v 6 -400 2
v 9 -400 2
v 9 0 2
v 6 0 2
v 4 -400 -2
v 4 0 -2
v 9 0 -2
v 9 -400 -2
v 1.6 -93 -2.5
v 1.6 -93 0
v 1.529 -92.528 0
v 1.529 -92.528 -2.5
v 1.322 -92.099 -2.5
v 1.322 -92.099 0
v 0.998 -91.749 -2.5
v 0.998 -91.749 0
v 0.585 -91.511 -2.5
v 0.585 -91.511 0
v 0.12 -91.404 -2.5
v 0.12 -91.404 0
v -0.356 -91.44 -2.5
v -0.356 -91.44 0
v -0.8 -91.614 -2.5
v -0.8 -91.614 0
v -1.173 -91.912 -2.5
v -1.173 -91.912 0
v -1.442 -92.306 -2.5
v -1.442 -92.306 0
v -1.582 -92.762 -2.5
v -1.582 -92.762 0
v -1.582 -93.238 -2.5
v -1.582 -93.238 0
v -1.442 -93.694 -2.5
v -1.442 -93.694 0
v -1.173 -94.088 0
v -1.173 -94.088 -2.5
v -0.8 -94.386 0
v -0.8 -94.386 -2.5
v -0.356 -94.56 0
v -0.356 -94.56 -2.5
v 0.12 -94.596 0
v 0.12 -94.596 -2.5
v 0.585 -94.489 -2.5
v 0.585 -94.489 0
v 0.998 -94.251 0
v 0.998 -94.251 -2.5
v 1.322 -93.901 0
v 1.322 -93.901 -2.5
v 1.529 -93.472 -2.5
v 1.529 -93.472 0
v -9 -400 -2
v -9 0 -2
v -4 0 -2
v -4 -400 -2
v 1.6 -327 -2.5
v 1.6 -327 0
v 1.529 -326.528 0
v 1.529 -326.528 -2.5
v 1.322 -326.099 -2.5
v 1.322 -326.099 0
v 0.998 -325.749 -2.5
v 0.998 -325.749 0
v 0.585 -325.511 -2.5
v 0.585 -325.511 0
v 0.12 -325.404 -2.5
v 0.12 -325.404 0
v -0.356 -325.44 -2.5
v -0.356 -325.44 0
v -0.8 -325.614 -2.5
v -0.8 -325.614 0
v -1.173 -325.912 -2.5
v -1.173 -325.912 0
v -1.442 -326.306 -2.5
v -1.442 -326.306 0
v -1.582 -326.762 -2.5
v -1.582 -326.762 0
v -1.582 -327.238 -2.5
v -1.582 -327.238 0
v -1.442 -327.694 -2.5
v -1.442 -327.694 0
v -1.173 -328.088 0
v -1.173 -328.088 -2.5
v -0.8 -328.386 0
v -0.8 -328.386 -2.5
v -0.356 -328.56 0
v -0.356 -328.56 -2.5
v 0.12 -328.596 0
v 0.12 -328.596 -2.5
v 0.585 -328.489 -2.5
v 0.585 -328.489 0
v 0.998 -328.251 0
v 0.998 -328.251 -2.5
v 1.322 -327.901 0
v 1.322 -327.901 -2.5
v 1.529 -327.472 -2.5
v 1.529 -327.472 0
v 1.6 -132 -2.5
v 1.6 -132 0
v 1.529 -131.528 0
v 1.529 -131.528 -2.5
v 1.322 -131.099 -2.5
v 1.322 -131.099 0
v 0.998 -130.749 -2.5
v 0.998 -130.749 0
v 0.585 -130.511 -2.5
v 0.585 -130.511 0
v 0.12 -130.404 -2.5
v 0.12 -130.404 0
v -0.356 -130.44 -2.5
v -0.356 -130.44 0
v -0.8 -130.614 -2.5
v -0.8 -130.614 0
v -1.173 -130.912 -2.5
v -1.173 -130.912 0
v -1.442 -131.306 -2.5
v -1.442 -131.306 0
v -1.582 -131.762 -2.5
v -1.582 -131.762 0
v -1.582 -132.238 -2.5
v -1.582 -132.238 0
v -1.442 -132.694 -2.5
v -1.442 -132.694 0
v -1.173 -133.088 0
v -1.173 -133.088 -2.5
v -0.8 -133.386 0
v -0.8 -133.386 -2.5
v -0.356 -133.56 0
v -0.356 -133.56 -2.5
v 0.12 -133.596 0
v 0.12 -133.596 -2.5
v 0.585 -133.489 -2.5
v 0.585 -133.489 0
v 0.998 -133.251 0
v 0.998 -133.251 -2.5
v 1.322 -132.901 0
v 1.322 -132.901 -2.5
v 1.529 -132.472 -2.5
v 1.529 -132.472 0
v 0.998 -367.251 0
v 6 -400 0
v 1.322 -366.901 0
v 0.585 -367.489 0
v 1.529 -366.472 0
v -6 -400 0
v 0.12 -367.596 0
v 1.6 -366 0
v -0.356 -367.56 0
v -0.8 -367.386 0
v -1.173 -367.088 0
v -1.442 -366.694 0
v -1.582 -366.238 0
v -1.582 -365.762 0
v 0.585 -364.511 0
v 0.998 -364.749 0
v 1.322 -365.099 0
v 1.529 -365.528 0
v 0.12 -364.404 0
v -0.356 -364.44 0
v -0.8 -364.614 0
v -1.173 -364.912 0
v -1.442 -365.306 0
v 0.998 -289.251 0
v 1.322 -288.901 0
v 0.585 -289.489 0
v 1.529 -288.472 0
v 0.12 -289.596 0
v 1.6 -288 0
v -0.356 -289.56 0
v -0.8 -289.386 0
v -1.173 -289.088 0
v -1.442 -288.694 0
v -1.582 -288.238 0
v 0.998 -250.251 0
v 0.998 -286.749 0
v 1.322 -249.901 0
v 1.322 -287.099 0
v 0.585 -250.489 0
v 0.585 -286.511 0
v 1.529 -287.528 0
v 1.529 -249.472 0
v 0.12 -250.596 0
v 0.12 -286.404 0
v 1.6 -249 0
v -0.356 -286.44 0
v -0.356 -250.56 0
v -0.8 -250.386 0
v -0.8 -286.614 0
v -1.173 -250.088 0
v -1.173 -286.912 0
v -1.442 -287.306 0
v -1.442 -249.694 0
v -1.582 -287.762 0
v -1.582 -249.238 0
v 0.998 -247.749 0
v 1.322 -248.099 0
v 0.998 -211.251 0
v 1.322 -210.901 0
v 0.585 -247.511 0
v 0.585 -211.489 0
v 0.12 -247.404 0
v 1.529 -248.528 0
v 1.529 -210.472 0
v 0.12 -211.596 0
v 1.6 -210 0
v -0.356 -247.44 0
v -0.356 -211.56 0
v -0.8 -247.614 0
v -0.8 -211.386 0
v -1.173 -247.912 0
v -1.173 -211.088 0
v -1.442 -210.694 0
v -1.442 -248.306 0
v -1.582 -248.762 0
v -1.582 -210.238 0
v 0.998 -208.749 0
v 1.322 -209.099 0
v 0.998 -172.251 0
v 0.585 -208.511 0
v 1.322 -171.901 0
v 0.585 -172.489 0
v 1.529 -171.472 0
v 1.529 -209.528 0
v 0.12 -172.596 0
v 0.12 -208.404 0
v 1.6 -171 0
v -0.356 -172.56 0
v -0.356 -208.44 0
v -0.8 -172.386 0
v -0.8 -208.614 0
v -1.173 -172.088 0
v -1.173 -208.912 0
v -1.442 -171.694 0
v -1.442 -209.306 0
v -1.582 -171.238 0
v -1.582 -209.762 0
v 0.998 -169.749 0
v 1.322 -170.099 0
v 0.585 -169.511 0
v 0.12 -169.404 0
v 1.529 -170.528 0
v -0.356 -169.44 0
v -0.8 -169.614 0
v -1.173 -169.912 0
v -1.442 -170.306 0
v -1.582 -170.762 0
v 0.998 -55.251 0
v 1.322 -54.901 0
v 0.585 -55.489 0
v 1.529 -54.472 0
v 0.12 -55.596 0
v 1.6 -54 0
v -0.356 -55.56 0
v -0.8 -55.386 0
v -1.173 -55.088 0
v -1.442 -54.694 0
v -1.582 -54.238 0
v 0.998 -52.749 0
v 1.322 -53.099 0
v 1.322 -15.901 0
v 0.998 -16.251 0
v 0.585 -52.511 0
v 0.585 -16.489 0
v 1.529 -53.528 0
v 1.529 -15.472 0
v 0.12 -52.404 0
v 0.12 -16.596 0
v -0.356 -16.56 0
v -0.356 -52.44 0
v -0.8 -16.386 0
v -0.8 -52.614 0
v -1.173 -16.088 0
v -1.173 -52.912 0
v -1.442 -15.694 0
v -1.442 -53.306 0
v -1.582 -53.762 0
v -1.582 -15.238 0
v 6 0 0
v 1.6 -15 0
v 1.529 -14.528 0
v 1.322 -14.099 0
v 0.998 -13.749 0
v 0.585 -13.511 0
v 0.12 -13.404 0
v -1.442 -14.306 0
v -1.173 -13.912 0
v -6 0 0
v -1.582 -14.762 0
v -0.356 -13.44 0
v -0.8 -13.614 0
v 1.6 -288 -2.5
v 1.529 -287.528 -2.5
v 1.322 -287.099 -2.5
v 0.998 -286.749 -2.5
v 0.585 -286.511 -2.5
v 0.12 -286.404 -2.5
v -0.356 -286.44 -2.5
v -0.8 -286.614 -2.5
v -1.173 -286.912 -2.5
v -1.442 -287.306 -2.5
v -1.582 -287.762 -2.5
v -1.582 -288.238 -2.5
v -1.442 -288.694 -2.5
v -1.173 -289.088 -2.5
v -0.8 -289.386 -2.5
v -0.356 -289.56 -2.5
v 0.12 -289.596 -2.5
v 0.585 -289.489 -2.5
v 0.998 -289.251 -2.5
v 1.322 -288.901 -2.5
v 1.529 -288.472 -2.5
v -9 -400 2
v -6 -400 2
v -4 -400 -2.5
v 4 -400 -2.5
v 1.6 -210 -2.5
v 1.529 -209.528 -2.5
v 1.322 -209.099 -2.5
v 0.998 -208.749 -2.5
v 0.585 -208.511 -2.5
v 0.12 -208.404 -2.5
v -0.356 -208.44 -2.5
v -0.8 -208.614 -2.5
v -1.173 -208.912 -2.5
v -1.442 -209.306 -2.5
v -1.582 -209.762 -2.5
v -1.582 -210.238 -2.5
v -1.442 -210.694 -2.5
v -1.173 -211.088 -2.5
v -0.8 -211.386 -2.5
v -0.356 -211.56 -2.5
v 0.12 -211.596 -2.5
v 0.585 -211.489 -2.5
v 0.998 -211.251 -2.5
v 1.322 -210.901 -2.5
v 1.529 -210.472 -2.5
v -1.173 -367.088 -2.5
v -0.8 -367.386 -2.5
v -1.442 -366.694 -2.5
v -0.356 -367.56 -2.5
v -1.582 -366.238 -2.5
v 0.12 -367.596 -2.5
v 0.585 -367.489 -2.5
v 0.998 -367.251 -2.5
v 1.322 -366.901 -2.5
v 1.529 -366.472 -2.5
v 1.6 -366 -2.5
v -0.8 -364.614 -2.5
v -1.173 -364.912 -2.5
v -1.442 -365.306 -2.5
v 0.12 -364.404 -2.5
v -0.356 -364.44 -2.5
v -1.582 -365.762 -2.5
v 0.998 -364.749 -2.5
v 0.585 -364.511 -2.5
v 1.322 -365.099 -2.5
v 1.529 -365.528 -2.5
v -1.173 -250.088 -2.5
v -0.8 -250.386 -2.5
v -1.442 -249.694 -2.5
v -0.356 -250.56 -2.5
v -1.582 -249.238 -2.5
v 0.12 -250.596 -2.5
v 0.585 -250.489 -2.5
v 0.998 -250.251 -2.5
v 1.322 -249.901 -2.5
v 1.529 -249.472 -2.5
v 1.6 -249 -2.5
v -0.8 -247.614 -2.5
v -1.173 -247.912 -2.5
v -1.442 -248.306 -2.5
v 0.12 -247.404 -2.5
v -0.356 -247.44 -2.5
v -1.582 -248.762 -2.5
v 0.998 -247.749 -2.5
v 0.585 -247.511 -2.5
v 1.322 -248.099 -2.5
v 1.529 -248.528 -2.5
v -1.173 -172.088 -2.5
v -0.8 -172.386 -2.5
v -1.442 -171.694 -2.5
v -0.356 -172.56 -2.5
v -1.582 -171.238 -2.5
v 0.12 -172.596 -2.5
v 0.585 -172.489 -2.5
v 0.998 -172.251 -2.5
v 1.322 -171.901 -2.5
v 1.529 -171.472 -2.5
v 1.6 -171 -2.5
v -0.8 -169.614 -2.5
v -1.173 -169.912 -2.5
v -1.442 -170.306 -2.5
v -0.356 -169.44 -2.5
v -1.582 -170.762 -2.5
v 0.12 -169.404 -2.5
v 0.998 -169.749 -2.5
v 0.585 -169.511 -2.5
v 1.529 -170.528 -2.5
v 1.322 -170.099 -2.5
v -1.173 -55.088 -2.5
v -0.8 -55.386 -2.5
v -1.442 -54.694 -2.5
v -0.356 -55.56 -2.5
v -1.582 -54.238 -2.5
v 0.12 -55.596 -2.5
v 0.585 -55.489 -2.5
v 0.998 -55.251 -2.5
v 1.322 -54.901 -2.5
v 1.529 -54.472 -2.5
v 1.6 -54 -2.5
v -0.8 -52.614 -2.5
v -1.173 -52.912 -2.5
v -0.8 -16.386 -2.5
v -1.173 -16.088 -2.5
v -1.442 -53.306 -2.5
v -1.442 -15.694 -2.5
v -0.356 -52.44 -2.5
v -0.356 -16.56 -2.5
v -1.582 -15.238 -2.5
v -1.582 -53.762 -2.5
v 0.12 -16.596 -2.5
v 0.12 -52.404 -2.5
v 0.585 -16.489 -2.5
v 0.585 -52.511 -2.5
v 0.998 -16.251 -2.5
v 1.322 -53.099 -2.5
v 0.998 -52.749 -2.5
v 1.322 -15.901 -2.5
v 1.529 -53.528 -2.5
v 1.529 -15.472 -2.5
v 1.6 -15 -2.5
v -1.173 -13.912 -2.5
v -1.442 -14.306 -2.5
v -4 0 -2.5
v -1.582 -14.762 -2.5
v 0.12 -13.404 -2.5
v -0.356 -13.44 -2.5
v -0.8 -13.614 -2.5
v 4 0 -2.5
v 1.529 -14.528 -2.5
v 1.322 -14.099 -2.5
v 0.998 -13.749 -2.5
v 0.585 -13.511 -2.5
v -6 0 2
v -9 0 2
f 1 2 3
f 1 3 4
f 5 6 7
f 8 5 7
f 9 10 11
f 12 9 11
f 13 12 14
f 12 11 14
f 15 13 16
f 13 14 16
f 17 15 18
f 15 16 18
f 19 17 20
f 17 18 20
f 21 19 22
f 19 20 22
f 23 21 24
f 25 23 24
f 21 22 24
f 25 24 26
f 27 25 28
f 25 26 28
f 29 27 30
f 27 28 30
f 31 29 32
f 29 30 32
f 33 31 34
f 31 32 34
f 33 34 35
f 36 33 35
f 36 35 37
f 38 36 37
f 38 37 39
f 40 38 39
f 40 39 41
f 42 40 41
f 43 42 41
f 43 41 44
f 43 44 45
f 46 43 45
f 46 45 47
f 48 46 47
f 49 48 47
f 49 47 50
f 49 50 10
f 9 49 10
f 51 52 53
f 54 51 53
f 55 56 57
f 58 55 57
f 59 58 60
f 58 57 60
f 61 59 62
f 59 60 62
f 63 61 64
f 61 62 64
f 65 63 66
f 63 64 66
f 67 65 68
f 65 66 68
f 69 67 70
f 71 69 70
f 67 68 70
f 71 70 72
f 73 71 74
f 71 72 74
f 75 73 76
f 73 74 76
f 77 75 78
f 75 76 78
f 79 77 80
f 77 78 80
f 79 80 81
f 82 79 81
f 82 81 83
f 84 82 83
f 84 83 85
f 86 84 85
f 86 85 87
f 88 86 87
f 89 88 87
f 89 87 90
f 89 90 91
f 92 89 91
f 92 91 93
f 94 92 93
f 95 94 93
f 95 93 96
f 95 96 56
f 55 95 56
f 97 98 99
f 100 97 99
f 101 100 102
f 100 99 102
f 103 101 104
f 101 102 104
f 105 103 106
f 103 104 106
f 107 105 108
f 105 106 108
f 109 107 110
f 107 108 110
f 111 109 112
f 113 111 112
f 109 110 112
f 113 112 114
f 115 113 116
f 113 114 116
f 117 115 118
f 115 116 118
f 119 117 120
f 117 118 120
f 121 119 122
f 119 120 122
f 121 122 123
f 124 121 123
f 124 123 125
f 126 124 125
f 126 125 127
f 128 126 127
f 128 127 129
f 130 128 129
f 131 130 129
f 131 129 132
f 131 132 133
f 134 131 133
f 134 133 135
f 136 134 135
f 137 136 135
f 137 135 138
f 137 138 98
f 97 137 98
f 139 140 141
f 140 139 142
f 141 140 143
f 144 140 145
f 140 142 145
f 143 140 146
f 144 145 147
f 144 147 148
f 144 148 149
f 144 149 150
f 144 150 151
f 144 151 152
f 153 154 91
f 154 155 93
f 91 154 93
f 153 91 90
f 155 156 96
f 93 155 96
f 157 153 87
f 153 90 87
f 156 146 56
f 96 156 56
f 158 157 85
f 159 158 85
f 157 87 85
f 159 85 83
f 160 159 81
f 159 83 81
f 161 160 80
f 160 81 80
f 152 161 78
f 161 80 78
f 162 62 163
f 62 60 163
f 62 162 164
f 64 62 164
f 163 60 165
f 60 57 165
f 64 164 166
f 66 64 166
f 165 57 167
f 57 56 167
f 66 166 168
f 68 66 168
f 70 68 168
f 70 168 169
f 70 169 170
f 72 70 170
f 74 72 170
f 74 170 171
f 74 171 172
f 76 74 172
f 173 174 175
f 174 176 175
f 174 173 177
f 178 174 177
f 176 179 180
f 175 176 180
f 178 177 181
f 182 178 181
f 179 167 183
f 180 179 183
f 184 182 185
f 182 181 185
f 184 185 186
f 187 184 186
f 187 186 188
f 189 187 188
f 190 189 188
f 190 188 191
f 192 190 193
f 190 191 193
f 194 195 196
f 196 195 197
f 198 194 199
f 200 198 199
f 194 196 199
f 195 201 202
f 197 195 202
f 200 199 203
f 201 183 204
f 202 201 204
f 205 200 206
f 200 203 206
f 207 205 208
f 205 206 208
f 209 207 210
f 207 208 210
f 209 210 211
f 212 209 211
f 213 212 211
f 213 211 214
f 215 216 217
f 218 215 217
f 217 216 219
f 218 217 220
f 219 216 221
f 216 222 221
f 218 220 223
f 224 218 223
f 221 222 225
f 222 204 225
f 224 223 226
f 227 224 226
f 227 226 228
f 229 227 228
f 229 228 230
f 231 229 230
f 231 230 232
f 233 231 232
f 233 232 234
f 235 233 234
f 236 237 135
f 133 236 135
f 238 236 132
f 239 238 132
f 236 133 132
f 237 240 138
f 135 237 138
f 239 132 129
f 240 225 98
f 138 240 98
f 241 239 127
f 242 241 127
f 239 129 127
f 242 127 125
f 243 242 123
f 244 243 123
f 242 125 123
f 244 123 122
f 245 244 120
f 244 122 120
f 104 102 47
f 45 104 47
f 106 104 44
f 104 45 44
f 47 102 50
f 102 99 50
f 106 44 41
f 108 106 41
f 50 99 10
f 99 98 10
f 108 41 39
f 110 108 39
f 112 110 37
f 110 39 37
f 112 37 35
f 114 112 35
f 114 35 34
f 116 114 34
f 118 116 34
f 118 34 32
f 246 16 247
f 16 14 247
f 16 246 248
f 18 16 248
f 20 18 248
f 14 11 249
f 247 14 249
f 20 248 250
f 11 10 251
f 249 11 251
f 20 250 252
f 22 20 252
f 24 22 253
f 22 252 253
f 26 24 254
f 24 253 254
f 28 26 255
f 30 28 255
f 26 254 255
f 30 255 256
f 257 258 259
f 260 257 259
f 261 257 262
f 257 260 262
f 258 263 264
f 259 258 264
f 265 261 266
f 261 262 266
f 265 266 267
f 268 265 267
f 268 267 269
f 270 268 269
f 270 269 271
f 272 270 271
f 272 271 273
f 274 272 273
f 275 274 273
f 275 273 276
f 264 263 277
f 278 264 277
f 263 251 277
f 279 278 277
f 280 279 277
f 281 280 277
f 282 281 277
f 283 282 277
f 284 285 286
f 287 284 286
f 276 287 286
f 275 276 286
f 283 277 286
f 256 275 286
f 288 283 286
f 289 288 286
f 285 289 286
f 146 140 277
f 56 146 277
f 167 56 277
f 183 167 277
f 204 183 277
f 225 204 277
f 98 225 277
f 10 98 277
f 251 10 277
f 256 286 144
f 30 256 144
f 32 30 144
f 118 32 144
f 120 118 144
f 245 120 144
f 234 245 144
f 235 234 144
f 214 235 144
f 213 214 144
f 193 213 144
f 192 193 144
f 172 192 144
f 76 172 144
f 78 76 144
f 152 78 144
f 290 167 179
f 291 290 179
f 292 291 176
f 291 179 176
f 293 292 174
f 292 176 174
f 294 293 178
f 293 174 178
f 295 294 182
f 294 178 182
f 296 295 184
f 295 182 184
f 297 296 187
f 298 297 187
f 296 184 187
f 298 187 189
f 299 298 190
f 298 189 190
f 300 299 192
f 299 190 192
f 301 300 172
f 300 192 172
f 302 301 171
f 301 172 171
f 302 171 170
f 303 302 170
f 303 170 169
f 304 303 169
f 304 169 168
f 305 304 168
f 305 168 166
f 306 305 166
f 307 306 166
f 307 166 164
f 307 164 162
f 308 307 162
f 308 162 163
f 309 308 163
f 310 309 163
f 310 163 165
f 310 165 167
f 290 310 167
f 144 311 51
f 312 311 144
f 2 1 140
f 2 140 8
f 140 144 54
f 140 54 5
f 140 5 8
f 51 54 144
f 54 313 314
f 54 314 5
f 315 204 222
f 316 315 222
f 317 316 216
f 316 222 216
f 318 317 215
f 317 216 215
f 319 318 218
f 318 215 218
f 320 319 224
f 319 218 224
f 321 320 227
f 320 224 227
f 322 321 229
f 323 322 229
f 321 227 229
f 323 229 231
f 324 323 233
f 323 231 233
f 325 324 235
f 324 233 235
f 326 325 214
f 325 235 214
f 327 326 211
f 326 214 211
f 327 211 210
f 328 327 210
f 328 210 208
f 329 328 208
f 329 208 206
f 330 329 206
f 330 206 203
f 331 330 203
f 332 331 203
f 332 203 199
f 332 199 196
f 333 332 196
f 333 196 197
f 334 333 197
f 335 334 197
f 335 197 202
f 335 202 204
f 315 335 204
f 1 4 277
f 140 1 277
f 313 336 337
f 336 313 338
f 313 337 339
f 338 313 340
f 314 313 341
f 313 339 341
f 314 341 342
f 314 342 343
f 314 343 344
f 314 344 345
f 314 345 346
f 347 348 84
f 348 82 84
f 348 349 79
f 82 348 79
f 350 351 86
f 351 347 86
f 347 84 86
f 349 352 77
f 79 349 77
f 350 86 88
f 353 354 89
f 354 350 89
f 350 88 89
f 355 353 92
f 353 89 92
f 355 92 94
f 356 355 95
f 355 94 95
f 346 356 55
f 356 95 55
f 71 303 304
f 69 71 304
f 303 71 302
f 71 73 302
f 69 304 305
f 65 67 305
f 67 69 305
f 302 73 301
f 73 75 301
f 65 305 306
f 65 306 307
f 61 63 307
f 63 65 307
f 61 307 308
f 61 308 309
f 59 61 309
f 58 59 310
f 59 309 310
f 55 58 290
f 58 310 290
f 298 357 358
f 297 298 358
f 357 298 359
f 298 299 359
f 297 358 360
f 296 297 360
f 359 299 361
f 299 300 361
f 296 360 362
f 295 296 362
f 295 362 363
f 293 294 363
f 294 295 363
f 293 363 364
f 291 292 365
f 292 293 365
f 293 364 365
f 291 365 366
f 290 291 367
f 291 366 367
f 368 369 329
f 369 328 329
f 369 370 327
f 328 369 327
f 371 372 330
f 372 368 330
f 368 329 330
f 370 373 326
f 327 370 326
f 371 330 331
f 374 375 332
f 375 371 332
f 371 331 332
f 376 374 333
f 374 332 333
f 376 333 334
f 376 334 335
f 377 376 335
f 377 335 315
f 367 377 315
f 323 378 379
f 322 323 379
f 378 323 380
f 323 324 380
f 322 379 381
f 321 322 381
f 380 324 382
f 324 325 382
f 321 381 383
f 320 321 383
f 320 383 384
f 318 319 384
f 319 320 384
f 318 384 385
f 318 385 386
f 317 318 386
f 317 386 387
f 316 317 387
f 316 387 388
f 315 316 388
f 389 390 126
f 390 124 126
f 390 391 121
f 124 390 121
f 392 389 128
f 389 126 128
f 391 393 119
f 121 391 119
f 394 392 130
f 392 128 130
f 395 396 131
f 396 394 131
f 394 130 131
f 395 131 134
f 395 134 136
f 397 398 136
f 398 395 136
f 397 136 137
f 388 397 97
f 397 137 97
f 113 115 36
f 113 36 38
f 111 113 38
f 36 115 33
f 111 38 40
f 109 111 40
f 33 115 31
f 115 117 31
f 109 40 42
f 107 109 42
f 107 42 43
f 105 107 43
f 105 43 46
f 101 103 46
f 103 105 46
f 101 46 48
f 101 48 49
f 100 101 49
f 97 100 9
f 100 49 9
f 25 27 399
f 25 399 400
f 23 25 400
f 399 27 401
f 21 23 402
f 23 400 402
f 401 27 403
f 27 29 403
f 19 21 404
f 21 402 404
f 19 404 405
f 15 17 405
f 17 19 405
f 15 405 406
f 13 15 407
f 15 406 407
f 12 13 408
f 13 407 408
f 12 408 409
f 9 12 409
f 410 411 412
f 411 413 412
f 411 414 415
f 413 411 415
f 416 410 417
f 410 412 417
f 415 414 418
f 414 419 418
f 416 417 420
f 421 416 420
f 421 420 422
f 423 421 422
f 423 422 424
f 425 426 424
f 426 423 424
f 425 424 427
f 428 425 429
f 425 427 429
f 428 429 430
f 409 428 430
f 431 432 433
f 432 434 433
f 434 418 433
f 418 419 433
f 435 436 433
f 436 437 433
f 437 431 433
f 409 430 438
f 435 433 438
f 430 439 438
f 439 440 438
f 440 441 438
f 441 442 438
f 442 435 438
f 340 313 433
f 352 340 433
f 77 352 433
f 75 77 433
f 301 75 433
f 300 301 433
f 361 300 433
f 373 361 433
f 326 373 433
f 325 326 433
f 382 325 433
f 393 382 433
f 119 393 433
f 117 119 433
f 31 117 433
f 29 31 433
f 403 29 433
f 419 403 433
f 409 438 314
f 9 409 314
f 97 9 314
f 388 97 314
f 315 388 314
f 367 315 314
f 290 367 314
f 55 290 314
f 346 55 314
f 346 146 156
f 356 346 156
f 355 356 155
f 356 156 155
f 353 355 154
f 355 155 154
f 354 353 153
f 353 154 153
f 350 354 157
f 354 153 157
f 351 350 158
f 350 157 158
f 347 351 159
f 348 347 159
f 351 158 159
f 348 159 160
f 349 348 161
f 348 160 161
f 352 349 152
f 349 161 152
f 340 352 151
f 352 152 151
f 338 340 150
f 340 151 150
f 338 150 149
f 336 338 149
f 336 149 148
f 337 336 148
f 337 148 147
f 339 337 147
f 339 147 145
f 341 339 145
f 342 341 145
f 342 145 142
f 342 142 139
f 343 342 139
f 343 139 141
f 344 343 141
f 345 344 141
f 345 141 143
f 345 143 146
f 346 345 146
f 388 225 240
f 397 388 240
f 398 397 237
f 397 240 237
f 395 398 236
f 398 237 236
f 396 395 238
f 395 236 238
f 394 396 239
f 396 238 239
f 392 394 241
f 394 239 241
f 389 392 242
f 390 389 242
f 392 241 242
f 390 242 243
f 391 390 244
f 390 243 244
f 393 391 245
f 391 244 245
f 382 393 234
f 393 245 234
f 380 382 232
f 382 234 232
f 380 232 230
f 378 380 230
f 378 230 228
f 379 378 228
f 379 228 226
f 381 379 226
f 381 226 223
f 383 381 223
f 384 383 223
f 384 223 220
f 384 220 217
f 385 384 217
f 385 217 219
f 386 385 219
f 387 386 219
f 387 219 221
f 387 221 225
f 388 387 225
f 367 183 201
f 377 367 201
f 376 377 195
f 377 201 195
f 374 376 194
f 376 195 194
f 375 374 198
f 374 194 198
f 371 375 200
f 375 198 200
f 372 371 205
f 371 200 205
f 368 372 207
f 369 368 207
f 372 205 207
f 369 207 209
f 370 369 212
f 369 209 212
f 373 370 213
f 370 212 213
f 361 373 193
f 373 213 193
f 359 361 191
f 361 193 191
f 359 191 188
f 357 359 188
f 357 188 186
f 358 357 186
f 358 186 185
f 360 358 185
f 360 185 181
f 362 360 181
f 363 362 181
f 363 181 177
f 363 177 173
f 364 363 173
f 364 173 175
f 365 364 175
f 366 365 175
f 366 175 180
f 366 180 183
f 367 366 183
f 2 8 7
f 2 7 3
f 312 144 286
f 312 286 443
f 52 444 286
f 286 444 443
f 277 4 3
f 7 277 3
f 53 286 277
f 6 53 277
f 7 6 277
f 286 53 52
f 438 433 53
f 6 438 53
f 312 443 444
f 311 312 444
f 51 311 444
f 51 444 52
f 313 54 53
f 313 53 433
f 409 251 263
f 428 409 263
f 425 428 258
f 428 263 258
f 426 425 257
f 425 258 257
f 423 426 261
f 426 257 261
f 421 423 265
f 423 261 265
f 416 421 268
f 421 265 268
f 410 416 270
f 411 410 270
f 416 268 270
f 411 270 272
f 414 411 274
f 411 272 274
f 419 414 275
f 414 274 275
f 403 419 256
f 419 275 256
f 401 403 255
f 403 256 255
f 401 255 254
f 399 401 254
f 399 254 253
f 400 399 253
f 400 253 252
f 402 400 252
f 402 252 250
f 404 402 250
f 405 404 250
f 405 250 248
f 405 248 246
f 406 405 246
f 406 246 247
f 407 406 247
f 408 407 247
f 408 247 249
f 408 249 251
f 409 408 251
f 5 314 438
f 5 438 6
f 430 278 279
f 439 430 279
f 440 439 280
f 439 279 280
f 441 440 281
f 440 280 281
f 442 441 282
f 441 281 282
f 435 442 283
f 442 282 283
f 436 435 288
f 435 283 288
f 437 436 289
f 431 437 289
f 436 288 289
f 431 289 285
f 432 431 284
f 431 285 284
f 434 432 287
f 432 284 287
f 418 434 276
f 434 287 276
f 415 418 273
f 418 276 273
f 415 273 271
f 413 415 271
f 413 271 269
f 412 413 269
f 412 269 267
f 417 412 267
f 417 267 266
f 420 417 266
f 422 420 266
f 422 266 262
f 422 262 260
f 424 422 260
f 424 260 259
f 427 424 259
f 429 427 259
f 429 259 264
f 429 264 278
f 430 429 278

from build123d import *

# Parameters (mm, degrees)
F1_DEPTH = 400
F2_R     = 1.6
F3_DEPTH = 25


with BuildPart() as f1:
    # F0 (on Front) → F1 (new body)
    with BuildSketch(Plane.XZ):
        Polygon((6, 0), (0, 0), (-6, 0), (-6, 2), (-9, 2), (-9, -2), (-4, -2), (-4, -2.5), (0, -2.5), (4, -2.5), (4, -2), (9, -2), (9, 2), (6, 2), align=None)
    extrude(amount=F1_DEPTH)

    # F2 (on face) → F3 (cut)
    with BuildSketch(Plane.XY):
        with Locations((0, -15)):
            Circle(F2_R)
        with Locations((0, -54)):
            Circle(F2_R)
        with Locations((0, -93)):
            Circle(F2_R)
        with Locations((0, -132)):
            Circle(F2_R)
        with Locations((0, -171)):
            Circle(F2_R)
        with Locations((0, -210)):
            Circle(F2_R)
        with Locations((0, -249)):
            Circle(F2_R)
        with Locations((0, -288)):
            Circle(F2_R)
        with Locations((0, -327)):
            Circle(F2_R)
        with Locations((0, -366)):
            Circle(F2_R)
    extrude(amount=-F3_DEPTH, mode=Mode.SUBTRACT)


solid = f1.part
